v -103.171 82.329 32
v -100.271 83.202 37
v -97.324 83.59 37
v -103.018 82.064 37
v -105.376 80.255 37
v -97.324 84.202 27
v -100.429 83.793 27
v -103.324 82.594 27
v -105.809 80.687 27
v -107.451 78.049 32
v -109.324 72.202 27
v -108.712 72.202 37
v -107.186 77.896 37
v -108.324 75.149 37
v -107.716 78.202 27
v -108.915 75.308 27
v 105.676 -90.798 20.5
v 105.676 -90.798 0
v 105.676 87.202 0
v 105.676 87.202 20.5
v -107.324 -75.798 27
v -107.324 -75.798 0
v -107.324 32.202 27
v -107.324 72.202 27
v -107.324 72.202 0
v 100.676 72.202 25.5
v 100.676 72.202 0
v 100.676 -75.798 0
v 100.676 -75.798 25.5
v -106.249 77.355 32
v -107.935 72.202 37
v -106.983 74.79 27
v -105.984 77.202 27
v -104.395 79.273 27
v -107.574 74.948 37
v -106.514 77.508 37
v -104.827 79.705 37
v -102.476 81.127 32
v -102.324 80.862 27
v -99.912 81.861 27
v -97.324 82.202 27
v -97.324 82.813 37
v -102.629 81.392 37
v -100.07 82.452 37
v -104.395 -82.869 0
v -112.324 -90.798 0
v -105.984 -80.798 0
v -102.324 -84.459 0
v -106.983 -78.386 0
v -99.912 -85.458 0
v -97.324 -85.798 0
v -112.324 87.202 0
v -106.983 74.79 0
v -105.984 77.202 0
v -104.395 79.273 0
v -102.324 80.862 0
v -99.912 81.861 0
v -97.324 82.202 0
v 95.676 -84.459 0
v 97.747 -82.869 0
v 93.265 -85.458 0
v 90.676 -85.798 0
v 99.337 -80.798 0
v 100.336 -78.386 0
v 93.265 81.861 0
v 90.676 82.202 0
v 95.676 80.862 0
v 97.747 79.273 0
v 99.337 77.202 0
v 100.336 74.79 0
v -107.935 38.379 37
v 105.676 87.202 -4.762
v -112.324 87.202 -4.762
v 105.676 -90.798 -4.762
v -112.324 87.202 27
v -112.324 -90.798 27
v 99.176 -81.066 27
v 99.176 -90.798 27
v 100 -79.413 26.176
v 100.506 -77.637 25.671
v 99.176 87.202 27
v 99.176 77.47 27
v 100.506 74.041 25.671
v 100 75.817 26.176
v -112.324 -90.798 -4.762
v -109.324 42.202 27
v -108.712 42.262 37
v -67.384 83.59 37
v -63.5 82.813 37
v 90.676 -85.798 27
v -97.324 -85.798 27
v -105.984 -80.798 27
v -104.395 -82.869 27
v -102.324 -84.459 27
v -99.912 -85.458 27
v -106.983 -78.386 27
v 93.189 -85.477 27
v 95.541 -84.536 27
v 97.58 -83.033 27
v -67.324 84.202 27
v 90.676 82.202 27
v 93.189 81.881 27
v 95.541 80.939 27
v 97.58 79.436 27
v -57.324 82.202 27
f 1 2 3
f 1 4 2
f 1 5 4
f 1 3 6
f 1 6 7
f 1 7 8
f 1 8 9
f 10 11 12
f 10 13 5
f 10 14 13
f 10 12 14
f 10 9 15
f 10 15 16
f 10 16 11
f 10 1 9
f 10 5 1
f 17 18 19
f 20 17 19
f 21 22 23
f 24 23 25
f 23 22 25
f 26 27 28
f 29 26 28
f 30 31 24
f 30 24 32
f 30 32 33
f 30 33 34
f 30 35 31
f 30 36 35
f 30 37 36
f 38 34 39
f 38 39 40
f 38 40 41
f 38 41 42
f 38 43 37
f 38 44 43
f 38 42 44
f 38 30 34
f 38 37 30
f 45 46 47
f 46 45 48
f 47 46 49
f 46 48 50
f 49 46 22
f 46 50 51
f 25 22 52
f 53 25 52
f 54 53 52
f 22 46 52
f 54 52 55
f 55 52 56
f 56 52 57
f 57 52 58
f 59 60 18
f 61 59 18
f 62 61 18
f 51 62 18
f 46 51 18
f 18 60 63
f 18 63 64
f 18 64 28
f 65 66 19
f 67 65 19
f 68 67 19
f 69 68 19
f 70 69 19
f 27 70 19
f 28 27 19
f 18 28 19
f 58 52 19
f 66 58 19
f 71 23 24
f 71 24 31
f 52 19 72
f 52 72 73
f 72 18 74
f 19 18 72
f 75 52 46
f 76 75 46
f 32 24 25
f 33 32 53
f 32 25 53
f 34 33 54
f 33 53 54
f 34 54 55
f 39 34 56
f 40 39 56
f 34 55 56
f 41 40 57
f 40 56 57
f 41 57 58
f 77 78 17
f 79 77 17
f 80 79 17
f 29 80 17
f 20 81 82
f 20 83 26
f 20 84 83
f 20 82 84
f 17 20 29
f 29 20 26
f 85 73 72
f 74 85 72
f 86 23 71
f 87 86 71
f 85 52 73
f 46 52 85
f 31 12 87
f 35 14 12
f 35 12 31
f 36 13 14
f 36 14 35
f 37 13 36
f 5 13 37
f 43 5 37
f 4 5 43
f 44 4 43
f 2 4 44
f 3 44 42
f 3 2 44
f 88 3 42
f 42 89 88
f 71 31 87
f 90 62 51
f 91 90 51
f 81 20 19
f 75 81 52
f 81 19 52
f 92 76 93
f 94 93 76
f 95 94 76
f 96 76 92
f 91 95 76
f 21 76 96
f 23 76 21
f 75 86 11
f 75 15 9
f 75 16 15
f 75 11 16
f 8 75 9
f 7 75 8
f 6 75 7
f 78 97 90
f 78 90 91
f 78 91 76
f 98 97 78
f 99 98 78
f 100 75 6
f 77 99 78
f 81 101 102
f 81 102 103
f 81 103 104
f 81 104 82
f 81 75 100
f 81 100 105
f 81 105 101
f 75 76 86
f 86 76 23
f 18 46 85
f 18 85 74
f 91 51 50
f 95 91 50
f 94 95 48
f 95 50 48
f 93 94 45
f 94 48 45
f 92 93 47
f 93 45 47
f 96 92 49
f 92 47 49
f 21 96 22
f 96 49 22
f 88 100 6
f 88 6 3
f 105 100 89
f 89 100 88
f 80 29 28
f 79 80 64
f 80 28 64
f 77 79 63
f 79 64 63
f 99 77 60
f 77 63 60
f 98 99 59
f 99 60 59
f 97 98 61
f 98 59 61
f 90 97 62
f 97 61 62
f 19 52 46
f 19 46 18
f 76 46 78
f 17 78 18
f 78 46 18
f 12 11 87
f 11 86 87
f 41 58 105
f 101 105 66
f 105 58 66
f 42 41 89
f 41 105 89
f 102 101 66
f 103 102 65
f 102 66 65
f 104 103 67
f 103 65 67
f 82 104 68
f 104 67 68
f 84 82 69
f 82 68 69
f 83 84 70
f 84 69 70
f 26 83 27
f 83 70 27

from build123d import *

# Parameters (mm, degrees)
F1_DEPTH    = 27
F2_T1_DEPTH = 211.4318788436
F3_DEPTH    = 4.7625
F5_DEPTH    = 10
F5_TAPER    = 3.5


# Not quite as in the source:
# - a fillet or chamfer that OpenCascade refuses, or shapes differently, is made with other operations: its cross-section is extruded or revolved along the edge and cut away or added
# - a length typed as a fraction of an inch, garbled in the dataset ("3 / 203.2 mm" for 3/8 in), is restored
# - a feature names something its author has since deleted; it is built from what else it names


with BuildPart() as f1:
    # F0 (on Top) → F1 (new body)
    with BuildSketch(Plane.XY):
        Polygon((-112.323590219, 87.2017167807), (-112.323590219, -90.7982832193), (105.676409781, -90.7982832193), (105.676409781, 77.2017167807), (105.676409781, 87.2017167807), align=None)
        with BuildLine():
            ThreePointArc((-107.323590219, 72.2017167807), (-104.3946580309, 79.2727845925), (-97.323590219, 82.2017167807))
            Line((-97.323590219, 82.2017167807), (90.676409781, 82.2017167807))
            ThreePointArc((90.676409781, 82.2017167807), (97.7474775928, 79.2727845925), (100.676409781, 72.2017167807))
            Line((100.676409781, 72.2017167807), (100.676409781, -75.7982832193))
            ThreePointArc((100.676409781, -75.7982832193), (97.7474775928, -82.8693510312), (90.676409781, -85.7982832193))
            Line((90.676409781, -85.7982832193), (-97.323590219, -85.7982832193))
            ThreePointArc((-97.323590219, -85.7982832193), (-104.3946580309, -82.8693510312), (-107.323590219, -75.7982832193))
            Line((-107.323590219, -75.7982832193), (-107.323590219, 72.2017167807))
        make_face(mode=Mode.SUBTRACT)
    extrude(amount=F1_DEPTH)

    # F2: chamfer of 6.5 on 1 edges, made by hand

    # F2_s2 → F2_t1 (cut)
    with BuildSketch(Plane.XZ.offset(-103.9176562024)):
        Polygon((99.176409781, 27), (105.676409781, 20.5), (105.676409781, 27), align=None)
    extrude(amount=F2_T1_DEPTH, mode=Mode.SUBTRACT)

    # F4 (on face) → F5 (join)
    with BuildSketch(Plane.XY.offset(27)):
        with BuildLine():
            ThreePointArc((-107.323590219, 72.2017167807), (-104.3946580309, 79.2727845925), (-97.323590219, 82.2017167807))
            Line((-97.323590219, 82.2017167807), (-57.323590219, 82.2017167807))
            Line((-57.323590219, 82.2017167807), (-67.323590219, 84.2017167807))
            Line((-67.323590219, 84.2017167807), (-97.323590219, 84.2017167807))
            ThreePointArc((-97.323590219, 84.2017167807), (-105.8088715933, 80.6869981549), (-109.323590219, 72.2017167807))
            Line((-109.323590219, 72.2017167807), (-109.323590219, 42.2017167807))
            Line((-109.323590219, 42.2017167807), (-107.323590219, 32.2017167807))
            Line((-107.323590219, 32.2017167807), (-107.323590219, 72.2017167807))
        make_face()
    extrude(amount=F5_DEPTH, taper=F5_TAPER)


with BuildPart() as f3:
    # F0 (on Top) → F3 (new body)
    with BuildSketch(Plane.XY):
        Polygon((-112.323590219, 87.2017167807), (-112.323590219, -90.7982832193), (105.676409781, -90.7982832193), (105.676409781, 77.2017167807), (105.676409781, 87.2017167807), align=None)
        with BuildLine():
            ThreePointArc((-107.323590219, 72.2017167807), (-104.3946580309, 79.2727845925), (-97.323590219, 82.2017167807))
            Line((-97.323590219, 82.2017167807), (90.676409781, 82.2017167807))
            ThreePointArc((90.676409781, 82.2017167807), (97.7474775928, 79.2727845925), (100.676409781, 72.2017167807))
            Line((100.676409781, 72.2017167807), (100.676409781, -75.7982832193))
            ThreePointArc((100.676409781, -75.7982832193), (97.7474775928, -82.8693510312), (90.676409781, -85.7982832193))
            Line((90.676409781, -85.7982832193), (-97.323590219, -85.7982832193))
            ThreePointArc((-97.323590219, -85.7982832193), (-104.3946580309, -82.8693510312), (-107.323590219, -75.7982832193))
            Line((-107.323590219, -75.7982832193), (-107.323590219, 72.2017167807))
        make_face(mode=Mode.SUBTRACT)
        with BuildLine():
            Line((90.676409781, 82.2017167807), (-97.323590219, 82.2017167807))
            ThreePointArc((-97.323590219, 82.2017167807), (-104.3946580309, 79.2727845925), (-107.323590219, 72.2017167807))
            Line((-107.323590219, 72.2017167807), (-107.323590219, -75.7982832193))
            ThreePointArc((-107.323590219, -75.7982832193), (-104.3946580309, -82.8693510312), (-97.323590219, -85.7982832193))
            Line((-97.323590219, -85.7982832193), (90.676409781, -85.7982832193))
            ThreePointArc((90.676409781, -85.7982832193), (97.7474775928, -82.8693510312), (100.676409781, -75.7982832193))
            Line((100.676409781, -75.7982832193), (100.676409781, 72.2017167807))
            ThreePointArc((100.676409781, 72.2017167807), (97.7474775928, 79.2727845925), (90.676409781, 82.2017167807))
        make_face()
    extrude(amount=-F3_DEPTH)


solid = Compound([f1.part, f3.part])
